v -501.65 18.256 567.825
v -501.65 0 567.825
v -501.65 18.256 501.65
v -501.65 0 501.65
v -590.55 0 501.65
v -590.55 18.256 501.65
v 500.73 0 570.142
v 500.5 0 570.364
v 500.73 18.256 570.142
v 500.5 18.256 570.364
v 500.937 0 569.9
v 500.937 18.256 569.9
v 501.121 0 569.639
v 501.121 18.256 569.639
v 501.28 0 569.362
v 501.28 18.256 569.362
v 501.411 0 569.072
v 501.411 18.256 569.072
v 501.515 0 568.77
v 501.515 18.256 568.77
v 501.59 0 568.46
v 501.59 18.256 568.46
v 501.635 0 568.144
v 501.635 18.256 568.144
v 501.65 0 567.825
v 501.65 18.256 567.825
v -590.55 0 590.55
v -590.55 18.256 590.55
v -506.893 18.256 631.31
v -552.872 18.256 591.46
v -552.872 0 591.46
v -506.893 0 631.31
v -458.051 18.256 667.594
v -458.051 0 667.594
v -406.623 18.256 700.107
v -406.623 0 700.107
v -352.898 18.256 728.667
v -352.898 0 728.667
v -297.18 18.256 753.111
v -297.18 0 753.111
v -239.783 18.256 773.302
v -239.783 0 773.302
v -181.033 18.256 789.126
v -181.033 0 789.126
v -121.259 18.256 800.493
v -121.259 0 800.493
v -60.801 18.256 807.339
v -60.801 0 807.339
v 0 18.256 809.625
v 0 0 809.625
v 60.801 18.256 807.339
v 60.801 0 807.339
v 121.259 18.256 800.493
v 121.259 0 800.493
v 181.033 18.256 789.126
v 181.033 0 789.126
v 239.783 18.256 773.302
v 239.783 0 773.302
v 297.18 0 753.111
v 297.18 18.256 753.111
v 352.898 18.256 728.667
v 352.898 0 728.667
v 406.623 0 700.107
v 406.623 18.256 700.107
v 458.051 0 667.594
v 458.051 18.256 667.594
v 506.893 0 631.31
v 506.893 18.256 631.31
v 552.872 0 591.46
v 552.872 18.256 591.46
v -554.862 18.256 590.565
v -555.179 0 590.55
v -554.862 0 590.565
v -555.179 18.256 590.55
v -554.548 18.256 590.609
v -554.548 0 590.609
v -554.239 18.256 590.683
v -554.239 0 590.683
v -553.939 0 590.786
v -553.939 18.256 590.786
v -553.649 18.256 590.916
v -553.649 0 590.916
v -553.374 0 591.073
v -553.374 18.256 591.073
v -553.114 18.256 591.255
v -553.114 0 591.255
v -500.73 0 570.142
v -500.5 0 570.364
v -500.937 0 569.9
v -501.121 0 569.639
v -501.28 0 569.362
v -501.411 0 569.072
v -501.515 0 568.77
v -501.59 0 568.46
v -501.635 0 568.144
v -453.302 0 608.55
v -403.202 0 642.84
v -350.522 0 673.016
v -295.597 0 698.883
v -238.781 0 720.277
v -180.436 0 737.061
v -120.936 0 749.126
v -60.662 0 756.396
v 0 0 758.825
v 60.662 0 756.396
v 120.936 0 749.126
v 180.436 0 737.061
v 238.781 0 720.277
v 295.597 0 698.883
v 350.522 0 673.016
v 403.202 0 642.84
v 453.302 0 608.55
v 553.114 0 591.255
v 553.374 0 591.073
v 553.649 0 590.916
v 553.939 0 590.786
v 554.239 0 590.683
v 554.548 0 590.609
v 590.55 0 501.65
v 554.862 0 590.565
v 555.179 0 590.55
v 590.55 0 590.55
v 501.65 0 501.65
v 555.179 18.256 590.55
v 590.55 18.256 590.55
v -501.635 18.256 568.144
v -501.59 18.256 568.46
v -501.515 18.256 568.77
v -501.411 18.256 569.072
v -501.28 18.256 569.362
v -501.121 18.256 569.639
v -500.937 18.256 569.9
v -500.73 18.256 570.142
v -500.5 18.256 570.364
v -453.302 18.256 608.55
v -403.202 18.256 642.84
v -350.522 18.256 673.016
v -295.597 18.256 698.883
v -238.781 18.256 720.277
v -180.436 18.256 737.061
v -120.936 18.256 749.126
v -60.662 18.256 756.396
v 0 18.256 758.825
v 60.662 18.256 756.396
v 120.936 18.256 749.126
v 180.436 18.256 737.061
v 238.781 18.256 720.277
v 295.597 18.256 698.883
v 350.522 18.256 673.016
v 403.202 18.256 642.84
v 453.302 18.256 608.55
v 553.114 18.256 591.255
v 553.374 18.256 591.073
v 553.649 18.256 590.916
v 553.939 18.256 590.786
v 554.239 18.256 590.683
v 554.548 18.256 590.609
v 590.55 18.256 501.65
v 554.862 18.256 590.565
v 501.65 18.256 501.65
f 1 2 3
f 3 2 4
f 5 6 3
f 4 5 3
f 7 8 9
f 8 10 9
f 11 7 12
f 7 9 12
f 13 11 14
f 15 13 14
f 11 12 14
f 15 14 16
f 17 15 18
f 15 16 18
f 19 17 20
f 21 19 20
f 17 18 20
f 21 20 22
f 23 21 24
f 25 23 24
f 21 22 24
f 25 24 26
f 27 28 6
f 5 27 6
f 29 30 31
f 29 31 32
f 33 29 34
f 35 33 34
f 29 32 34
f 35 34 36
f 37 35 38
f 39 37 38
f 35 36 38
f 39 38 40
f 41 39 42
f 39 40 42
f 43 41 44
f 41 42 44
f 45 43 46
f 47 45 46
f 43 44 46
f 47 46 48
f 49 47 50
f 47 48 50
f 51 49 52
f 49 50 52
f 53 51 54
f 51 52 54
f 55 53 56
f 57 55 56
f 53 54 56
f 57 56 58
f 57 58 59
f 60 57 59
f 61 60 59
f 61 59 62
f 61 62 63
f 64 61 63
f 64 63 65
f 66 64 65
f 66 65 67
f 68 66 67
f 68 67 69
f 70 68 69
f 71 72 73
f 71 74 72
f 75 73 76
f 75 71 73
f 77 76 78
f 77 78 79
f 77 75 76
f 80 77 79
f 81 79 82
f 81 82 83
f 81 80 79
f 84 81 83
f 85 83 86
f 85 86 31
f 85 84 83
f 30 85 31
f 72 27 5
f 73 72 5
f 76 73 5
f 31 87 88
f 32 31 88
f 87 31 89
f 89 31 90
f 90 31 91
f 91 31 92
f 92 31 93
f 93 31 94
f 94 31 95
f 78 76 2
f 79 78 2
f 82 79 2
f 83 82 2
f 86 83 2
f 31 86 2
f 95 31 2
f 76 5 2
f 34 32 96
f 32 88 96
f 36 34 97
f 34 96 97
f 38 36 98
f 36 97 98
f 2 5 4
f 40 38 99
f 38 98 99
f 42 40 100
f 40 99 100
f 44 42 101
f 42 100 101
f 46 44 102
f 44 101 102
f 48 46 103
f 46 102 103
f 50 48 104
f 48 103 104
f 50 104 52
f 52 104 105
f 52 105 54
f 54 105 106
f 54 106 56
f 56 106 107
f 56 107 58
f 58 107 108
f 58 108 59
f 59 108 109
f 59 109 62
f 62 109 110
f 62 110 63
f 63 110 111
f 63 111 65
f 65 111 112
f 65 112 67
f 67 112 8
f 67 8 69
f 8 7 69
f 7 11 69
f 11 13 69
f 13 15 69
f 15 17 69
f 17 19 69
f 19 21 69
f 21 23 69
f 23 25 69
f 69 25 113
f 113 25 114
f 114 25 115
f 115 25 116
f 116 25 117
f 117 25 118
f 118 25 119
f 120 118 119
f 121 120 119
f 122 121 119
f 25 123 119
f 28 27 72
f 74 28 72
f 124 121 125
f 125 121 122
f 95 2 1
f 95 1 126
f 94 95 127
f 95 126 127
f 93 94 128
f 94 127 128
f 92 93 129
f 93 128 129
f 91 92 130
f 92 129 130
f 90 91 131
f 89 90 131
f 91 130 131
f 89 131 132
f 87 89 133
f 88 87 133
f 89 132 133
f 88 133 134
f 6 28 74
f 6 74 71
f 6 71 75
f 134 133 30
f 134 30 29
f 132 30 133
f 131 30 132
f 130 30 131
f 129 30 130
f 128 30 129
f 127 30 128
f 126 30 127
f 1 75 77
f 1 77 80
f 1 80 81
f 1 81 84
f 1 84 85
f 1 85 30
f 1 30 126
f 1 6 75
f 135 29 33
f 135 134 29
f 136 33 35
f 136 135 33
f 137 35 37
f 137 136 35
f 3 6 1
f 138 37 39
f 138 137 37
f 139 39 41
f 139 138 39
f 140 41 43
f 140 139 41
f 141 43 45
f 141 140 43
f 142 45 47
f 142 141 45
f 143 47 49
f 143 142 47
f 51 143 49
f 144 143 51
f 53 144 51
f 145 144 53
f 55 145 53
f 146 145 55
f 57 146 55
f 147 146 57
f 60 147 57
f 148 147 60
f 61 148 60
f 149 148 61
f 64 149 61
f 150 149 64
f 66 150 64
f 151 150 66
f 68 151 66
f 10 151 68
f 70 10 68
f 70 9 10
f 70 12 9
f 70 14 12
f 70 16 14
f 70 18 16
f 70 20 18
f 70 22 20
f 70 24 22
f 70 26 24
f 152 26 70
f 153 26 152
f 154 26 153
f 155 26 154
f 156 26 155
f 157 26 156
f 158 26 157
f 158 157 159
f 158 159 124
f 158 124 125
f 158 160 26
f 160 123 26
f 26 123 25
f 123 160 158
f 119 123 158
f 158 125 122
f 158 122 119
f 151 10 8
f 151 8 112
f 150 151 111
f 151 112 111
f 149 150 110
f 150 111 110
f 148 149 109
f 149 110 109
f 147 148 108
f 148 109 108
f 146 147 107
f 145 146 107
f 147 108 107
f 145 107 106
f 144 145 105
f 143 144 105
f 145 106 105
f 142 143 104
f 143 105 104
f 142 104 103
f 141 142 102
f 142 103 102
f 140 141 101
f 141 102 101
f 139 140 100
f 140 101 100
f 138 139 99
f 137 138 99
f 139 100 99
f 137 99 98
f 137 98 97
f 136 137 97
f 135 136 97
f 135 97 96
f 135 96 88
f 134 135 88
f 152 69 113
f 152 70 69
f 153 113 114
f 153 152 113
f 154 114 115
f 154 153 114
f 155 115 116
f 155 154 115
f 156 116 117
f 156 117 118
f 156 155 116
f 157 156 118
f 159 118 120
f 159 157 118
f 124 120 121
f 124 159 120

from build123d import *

# Parameters (mm, degrees)
BOSS_EXTRUDE1_DEPTH = 18.25625
SKETCH4_W           = 88.9
SKETCH4_H           = 88.9
BOSS_EXTRUDE2_DEPTH = 18.25625
FILLET1_R           = 3.3782


with BuildPart() as part:
    # Sketch3 → Boss-Extrude1 (new body)
    with BuildSketch(Plane(origin=(0, 0, 0), x_dir=(1, 0, 0), z_dir=(0, 1, 0))):
        with BuildLine():
            Line((-501.65, -501.65), (-590.55, -590.55))
            Line((-590.55, -590.55), (-553.84414606, -590.55))
            ThreePointArc((-553.84414606, -590.55), (0, -809.625), (553.84414606, -590.55))
            Line((553.84414606, -590.55), (590.55, -590.55))
            Line((590.55, -590.55), (501.65, -501.65))
            Line((501.65, -501.65), (501.65, -569.352841501))
            ThreePointArc((501.65, -569.352841501), (0, -758.825), (-501.65, -569.352841501))
            Line((-501.65, -569.352841501), (-501.65, -501.65))
        make_face()
    extrude(amount=BOSS_EXTRUDE1_DEPTH)

    # Sketch4 → Boss-Extrude2 (add)
    with BuildSketch(Plane(origin=(0, 18.25625, 0), x_dir=(1, 0, 0), z_dir=(0, 1, 0))):
        with Locations((-546.1, -546.1)):
            Rectangle(SKETCH4_W, SKETCH4_H)
        with Locations((546.1, -546.1)):
            Rectangle(SKETCH4_W, SKETCH4_H)
    extrude(amount=-BOSS_EXTRUDE2_DEPTH)

    # Fillet1
    fillet1_edges = [part.edges().sort_by_distance(p)[0] for p in [
        (-501.65, 9.128125, 569.352841501),
        (501.65, 9.128125, 569.352841501),
        (553.84414606, 9.128125, 590.55),
        (-553.84414606, 9.128125, 590.55),
    ]]
    fillet(fillet1_edges, radius=FILLET1_R)


solid = part.part
